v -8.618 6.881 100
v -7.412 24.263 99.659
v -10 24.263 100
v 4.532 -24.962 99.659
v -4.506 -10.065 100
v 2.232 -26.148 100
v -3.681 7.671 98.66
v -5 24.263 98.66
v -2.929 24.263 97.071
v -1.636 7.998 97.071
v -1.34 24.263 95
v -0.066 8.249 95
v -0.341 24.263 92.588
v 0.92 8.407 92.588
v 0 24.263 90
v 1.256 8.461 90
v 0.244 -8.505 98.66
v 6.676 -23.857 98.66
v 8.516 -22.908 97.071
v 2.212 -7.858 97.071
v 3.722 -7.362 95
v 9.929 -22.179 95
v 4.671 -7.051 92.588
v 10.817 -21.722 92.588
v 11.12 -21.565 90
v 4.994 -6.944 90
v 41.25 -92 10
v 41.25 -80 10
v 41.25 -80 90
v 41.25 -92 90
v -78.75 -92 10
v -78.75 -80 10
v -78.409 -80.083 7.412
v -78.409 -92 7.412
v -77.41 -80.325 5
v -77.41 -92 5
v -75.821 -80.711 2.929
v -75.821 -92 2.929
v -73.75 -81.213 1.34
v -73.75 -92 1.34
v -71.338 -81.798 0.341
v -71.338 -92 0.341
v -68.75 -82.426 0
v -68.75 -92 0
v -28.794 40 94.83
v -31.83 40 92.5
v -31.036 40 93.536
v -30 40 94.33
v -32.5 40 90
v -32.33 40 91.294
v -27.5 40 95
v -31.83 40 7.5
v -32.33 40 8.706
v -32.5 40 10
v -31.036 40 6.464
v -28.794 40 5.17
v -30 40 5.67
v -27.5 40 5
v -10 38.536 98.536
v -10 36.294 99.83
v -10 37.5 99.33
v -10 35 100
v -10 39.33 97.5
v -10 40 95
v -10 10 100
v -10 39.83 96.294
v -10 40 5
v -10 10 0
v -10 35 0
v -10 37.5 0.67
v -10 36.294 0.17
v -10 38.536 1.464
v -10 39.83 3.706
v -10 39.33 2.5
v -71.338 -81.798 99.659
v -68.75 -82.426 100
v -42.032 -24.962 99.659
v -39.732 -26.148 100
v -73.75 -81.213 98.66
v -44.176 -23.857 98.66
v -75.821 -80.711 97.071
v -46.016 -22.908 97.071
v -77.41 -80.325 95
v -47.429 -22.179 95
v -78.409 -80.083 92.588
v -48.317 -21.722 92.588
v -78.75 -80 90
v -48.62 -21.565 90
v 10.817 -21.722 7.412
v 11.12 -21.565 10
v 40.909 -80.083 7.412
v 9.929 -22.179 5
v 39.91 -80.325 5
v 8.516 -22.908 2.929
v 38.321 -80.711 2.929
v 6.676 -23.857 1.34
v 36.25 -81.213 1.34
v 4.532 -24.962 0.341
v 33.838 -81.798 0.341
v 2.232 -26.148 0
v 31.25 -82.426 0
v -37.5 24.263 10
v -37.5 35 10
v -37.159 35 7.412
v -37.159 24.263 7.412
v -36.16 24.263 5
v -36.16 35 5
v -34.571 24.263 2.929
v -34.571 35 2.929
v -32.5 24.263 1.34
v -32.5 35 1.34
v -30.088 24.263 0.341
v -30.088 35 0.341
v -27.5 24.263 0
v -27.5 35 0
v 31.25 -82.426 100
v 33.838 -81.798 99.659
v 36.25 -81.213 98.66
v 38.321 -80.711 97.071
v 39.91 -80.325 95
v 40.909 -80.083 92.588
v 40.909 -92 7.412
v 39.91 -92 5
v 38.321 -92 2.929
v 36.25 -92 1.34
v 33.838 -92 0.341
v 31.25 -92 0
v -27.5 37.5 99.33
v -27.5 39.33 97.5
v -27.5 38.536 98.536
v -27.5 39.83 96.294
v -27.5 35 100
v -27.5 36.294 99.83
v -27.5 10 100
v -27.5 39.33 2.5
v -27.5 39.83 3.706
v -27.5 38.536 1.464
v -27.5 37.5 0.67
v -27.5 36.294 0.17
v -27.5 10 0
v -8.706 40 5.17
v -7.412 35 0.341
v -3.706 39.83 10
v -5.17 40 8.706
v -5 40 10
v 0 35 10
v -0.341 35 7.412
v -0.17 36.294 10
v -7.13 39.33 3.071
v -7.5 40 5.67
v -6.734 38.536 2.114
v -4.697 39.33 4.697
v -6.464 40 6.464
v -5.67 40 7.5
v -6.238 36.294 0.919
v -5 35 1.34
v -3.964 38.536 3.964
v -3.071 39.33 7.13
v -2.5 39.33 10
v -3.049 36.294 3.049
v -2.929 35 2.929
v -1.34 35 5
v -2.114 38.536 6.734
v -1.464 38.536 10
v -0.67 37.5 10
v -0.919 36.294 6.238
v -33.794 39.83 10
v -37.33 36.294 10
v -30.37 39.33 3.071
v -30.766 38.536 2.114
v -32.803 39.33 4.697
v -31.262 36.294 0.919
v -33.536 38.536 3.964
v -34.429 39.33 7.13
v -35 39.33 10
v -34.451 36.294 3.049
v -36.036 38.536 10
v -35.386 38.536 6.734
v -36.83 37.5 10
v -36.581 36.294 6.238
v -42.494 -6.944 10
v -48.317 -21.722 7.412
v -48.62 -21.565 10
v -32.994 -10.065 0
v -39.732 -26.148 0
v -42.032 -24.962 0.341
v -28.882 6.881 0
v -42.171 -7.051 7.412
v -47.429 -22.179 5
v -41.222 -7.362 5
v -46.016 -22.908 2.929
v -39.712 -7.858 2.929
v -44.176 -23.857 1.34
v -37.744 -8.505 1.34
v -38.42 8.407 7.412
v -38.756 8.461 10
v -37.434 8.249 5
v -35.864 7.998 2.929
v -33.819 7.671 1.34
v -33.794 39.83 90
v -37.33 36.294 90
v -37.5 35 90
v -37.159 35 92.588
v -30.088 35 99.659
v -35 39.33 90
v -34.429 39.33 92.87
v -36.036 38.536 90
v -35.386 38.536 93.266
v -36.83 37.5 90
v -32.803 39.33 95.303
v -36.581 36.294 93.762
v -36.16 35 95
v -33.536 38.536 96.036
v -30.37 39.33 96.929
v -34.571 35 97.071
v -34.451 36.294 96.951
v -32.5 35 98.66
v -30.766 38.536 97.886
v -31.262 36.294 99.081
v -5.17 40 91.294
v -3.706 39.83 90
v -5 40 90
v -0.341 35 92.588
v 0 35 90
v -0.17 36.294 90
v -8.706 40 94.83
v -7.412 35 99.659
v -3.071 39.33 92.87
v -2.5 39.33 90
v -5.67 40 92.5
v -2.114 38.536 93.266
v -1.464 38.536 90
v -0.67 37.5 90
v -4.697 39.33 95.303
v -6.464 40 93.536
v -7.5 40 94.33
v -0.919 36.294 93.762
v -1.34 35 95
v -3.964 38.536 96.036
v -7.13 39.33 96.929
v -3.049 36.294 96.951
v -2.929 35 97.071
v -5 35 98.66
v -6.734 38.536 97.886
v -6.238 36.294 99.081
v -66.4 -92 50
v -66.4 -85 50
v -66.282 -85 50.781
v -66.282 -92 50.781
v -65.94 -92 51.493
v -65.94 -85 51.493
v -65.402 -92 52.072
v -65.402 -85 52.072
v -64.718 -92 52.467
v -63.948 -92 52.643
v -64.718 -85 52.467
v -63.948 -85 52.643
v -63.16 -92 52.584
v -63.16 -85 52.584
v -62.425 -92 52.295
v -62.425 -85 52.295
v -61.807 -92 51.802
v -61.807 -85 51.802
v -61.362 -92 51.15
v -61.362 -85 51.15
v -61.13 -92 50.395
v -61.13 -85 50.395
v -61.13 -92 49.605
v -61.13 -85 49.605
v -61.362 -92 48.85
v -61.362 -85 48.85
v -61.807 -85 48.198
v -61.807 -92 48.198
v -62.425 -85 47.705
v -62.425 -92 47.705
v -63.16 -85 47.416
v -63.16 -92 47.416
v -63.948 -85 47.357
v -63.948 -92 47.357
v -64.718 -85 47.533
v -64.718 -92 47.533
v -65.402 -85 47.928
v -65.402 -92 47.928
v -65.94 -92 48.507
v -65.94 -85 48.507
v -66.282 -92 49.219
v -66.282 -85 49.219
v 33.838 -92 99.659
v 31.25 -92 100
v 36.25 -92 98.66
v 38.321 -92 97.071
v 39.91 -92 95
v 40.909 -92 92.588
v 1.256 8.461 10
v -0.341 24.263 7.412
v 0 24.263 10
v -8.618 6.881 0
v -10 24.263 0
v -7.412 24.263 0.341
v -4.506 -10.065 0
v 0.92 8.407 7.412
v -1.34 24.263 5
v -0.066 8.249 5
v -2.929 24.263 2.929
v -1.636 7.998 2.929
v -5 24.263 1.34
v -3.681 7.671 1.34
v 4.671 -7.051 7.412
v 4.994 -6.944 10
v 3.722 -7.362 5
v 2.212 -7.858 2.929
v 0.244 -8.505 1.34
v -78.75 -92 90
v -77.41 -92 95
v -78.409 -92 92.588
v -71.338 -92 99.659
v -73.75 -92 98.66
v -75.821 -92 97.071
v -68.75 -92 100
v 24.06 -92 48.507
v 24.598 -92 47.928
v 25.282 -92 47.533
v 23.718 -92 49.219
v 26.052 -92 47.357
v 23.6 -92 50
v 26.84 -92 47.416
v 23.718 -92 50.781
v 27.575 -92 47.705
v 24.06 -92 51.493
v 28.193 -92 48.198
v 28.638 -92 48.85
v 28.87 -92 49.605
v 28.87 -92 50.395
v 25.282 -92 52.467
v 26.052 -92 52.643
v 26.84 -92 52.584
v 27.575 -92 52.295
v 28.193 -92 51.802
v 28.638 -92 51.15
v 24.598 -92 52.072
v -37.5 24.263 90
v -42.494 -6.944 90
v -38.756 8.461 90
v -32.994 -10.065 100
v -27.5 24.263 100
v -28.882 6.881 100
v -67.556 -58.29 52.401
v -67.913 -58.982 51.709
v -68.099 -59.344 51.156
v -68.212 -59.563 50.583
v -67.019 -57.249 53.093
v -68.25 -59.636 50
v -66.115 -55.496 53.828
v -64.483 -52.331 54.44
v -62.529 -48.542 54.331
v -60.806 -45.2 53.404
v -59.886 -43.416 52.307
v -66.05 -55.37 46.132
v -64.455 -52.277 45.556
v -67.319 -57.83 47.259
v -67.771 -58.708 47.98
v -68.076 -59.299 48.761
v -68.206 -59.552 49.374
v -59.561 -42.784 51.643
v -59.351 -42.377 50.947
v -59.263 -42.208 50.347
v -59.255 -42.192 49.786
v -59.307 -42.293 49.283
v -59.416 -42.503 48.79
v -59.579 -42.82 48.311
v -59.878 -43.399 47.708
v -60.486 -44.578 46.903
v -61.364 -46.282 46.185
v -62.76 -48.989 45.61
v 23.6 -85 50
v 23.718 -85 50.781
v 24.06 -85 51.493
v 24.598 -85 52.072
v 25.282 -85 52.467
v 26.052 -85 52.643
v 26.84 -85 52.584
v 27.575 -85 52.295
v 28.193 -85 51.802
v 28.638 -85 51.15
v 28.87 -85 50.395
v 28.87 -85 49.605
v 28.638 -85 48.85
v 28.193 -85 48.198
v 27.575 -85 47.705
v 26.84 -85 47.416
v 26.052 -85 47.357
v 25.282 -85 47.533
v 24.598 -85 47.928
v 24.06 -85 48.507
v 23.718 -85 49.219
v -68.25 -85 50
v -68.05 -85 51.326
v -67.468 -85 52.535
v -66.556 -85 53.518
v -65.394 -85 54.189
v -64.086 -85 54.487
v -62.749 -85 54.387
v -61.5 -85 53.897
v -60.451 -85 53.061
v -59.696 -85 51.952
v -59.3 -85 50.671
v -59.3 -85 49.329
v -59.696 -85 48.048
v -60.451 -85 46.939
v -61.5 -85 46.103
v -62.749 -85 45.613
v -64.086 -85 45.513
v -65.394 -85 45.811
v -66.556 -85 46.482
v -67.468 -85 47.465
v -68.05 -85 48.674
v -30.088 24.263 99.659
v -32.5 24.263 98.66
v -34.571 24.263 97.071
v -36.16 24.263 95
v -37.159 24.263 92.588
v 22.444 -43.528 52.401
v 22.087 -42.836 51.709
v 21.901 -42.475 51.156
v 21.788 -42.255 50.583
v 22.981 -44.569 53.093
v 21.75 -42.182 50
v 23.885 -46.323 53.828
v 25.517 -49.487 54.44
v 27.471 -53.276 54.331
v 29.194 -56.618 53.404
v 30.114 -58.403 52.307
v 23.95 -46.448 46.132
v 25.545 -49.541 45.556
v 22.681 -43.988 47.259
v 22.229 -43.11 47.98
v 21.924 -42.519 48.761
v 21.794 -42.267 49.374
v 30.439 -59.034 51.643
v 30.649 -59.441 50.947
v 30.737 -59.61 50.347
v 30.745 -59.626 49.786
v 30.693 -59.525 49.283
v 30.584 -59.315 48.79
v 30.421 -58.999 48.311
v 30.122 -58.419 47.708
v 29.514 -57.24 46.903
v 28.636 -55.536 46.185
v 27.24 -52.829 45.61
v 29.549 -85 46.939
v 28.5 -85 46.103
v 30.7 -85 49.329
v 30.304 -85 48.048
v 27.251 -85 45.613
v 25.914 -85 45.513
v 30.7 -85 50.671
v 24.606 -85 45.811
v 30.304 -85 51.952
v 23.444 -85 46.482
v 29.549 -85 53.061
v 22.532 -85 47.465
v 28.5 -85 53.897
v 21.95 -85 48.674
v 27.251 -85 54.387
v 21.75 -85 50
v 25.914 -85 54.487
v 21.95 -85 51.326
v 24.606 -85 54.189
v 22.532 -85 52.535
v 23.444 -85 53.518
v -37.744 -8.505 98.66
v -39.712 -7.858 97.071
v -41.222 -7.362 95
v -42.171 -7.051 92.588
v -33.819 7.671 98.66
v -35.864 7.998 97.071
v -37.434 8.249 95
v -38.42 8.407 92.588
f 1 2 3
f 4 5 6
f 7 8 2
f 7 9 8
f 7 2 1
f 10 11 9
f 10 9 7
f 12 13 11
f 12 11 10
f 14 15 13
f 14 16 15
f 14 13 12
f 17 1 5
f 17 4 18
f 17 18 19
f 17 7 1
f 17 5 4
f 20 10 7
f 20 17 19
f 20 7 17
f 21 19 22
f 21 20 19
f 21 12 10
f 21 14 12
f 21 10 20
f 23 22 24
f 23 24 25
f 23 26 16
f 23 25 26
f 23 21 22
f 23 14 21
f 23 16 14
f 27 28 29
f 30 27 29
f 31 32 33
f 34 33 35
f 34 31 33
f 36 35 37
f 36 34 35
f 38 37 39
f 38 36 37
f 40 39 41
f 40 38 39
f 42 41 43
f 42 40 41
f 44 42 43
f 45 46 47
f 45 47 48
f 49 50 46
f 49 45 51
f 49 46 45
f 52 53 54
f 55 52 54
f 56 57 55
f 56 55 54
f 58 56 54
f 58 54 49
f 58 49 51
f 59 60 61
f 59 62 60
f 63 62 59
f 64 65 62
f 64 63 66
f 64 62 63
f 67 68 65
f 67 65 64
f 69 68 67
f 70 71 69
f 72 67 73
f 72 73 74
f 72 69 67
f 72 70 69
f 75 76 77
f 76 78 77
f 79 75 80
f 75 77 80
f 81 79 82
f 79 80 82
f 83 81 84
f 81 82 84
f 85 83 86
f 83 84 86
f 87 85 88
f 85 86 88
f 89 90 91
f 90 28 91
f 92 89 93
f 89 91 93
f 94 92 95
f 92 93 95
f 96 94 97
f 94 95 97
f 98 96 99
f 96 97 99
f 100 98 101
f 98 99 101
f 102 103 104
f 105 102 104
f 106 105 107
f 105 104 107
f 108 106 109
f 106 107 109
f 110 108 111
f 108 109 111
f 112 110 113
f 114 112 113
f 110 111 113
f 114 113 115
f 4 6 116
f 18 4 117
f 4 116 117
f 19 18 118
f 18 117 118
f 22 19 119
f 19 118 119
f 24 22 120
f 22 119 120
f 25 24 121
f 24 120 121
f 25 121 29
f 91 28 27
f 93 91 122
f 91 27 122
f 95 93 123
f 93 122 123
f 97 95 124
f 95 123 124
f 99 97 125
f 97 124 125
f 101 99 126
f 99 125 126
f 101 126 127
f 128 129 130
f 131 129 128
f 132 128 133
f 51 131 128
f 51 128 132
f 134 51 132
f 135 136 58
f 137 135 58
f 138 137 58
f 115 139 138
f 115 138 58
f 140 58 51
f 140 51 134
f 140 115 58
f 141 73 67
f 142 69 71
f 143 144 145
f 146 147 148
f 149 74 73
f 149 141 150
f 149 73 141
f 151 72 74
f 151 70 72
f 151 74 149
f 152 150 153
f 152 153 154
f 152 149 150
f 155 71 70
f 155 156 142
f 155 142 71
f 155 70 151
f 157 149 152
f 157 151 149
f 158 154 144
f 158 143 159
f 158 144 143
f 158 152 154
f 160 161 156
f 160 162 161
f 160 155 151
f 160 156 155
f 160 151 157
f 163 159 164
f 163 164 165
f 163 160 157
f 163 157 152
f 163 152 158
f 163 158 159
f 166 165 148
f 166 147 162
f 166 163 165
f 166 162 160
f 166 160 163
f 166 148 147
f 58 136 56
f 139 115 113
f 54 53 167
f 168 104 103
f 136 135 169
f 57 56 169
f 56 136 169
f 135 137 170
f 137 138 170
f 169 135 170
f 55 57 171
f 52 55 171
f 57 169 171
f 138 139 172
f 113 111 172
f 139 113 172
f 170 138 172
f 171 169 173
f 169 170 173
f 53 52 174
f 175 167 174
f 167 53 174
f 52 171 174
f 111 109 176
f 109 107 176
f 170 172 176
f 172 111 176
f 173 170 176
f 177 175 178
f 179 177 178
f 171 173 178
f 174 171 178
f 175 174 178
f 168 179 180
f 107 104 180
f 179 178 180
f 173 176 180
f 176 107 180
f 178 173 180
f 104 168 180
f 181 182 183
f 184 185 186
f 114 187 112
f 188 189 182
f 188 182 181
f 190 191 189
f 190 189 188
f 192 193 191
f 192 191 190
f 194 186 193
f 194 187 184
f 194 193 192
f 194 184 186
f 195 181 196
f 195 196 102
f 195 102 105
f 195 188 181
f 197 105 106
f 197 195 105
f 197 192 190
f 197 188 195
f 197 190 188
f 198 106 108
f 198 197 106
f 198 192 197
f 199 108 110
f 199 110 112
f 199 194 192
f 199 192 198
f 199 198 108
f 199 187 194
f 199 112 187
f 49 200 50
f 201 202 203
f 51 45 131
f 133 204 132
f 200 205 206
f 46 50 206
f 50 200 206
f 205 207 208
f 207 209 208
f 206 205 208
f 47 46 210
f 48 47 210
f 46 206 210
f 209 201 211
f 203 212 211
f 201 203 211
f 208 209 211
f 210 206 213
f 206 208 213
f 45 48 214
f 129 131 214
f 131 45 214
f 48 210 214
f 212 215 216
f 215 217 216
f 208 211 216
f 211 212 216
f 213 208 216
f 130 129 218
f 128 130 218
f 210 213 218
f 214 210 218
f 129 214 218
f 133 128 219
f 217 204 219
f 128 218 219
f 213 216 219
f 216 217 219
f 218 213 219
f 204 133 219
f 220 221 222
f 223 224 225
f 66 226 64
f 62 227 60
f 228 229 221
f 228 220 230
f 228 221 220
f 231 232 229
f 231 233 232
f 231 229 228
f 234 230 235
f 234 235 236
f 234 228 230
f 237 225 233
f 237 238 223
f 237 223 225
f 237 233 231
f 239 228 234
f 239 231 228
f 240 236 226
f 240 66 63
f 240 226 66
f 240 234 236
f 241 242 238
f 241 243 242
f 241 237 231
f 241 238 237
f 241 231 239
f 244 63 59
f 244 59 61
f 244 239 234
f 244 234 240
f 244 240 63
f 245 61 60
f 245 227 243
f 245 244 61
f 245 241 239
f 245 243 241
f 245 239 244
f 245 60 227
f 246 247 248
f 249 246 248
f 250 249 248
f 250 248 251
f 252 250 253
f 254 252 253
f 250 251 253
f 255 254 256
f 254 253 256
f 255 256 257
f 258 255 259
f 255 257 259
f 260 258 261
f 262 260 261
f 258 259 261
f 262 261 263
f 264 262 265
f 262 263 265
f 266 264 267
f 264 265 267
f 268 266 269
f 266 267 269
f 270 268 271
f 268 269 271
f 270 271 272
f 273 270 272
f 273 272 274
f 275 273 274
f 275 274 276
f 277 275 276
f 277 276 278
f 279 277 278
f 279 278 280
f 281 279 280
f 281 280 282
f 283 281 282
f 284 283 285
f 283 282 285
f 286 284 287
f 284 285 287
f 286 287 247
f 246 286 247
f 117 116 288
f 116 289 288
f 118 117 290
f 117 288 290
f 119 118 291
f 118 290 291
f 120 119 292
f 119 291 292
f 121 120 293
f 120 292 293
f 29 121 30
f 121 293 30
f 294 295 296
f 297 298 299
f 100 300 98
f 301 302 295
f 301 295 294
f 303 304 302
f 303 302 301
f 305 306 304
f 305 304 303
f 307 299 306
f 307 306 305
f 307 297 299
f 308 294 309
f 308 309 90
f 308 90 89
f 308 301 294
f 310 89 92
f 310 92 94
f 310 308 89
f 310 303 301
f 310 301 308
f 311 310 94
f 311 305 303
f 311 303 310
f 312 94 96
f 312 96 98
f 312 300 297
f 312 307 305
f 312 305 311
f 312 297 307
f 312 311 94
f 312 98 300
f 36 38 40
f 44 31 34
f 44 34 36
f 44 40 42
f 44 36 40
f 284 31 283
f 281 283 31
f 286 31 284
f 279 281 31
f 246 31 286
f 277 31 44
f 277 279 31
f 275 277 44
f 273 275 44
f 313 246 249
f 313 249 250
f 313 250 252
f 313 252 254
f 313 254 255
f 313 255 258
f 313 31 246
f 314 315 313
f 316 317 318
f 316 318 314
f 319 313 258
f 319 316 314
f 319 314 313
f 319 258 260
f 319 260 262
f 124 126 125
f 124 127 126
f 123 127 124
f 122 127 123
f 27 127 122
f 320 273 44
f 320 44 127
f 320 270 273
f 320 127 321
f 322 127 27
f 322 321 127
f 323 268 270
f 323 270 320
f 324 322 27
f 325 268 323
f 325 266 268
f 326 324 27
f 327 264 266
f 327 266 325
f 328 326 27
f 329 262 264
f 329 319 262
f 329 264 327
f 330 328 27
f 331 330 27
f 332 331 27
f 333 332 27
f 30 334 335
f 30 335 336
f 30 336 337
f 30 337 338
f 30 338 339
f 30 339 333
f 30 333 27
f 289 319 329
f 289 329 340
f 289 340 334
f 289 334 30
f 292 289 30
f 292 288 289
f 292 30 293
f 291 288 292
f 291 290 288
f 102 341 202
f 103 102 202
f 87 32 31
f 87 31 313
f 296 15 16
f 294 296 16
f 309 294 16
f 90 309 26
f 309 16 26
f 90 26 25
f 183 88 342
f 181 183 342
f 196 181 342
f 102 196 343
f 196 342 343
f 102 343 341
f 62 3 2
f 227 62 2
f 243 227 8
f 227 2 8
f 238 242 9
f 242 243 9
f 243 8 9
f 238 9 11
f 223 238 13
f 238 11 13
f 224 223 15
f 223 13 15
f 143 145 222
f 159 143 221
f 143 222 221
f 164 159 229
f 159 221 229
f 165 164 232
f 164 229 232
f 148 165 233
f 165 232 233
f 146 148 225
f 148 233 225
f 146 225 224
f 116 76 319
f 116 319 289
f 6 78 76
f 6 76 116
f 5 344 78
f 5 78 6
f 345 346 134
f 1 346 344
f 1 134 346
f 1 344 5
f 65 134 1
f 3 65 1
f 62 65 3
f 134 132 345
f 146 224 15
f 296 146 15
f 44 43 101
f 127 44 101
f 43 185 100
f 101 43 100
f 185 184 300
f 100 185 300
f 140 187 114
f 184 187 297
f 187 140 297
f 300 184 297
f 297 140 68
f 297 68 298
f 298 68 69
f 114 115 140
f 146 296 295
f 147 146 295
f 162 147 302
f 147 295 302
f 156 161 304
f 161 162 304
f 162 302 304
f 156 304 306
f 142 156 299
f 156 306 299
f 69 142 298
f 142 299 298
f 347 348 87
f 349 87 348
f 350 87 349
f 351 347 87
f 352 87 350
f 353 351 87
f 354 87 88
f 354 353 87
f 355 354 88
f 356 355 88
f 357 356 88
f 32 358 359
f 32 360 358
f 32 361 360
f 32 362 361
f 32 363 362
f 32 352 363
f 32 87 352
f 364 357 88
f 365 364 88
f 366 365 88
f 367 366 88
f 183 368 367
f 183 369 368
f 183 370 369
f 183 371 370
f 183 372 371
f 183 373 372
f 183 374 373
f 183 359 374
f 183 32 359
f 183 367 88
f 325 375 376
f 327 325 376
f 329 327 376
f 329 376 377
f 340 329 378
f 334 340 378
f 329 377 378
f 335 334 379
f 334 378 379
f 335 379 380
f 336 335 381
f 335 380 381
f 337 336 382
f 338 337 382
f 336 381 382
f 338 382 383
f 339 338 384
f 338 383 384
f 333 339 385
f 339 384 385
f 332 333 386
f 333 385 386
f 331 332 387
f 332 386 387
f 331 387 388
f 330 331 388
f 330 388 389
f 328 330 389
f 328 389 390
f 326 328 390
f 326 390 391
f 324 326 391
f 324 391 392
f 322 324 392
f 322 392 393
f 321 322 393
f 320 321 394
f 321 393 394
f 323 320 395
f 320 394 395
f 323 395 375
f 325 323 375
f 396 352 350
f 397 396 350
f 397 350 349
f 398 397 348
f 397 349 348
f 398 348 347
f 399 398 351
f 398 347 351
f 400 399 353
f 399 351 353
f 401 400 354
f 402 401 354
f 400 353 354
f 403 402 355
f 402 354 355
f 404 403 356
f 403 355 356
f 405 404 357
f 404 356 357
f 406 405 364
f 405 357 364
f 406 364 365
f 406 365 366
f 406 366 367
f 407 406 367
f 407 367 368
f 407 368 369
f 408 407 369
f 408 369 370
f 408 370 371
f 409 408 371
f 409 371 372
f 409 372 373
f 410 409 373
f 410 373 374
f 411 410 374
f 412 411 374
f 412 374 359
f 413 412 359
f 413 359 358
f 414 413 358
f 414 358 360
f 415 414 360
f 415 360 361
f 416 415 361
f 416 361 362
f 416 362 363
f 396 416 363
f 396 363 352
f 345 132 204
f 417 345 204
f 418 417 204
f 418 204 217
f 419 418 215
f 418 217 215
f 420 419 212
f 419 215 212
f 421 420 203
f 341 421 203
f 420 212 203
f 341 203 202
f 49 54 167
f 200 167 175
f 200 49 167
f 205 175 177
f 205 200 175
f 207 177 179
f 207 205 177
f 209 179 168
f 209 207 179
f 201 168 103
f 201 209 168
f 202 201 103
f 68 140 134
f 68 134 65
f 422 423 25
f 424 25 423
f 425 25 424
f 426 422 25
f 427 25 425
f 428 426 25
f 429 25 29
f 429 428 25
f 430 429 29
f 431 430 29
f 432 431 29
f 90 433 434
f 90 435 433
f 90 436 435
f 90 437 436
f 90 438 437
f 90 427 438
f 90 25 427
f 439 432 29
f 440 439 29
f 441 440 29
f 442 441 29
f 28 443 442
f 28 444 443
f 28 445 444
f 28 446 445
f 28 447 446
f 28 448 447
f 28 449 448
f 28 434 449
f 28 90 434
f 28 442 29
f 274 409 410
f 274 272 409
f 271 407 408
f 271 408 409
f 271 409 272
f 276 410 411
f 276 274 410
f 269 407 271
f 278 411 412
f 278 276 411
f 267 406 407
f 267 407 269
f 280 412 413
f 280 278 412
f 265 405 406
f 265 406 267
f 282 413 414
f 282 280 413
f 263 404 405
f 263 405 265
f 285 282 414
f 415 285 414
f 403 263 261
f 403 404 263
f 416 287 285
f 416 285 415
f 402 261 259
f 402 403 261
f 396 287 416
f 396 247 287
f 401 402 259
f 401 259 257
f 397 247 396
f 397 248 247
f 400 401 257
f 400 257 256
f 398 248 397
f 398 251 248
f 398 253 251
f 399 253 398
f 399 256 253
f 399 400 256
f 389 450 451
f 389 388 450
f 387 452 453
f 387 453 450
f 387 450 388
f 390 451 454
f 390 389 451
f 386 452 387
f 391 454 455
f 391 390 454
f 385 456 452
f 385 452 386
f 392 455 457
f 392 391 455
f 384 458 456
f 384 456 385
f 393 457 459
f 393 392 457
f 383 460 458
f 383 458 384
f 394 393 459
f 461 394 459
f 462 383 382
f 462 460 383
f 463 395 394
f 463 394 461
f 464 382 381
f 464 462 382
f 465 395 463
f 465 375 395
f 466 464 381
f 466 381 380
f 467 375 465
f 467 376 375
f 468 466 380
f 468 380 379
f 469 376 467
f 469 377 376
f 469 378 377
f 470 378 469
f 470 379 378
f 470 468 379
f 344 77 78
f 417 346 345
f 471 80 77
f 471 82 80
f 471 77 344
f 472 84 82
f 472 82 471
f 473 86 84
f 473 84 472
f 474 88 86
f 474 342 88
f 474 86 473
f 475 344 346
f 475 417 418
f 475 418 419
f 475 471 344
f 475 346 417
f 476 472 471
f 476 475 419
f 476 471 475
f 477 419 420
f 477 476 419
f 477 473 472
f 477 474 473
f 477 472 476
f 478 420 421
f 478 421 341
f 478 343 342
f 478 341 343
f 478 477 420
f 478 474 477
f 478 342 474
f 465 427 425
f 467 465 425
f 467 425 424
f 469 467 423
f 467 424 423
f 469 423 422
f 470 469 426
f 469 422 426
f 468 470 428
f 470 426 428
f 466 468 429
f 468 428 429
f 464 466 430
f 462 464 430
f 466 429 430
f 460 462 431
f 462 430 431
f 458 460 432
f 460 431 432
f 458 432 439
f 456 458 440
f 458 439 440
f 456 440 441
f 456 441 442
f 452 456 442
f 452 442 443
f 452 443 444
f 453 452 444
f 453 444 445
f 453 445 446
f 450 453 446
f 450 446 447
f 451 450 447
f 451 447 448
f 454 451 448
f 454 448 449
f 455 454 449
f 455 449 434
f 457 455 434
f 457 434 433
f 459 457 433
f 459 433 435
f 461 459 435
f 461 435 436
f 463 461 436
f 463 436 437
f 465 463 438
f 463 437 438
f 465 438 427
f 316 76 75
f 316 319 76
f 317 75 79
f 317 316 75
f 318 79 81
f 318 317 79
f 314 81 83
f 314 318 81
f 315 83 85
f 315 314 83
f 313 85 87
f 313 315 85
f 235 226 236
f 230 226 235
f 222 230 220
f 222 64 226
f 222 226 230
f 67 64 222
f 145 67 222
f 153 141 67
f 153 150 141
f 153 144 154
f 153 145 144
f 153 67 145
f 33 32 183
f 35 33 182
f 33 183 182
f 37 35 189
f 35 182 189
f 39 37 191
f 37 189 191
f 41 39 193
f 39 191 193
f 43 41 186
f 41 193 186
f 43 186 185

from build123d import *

# Parameters (mm, degrees)
BOSS_EXTRUDE1_DEPTH = 100
SKETCH2_W           = 120
SKETCH2_H           = 100
BOSS_EXTRUDE2_DEPTH = 92
SKETCH3_R           = 4.5
CUT_EXTRUDE1_DEPTH  = 85
SKETCH4_R           = 2.65
CUT_EXTRUDE2_DEPTH  = 7
CUT_EXTRUDE3_REACH  = 159.053
FILLET1_R           = 100
FILLET2_R           = 100
FILLET4_R           = 10
FILLET5_R           = 5


with BuildPart() as part:
    # Sketch1 → Boss-Extrude1 (new body)
    with BuildSketch(Plane.XY):
        Polygon((0, 0), (-37.5, 0), (-37.5, 40), (-27.5, 40), (-27.5, 10), (-10, 10), (-10, 40), (0, 40), align=None)
    extrude(amount=BOSS_EXTRUDE1_DEPTH)

    # Sketch2 → Boss-Extrude2 (add)
    with BuildSketch(Plane.XZ):
        with Locations((-18.75, 50)):
            Rectangle(SKETCH2_W, SKETCH2_H)
    extrude(amount=BOSS_EXTRUDE2_DEPTH)

    # Sketch3 → Cut-Extrude1 (cut)
    with BuildSketch(Plane(origin=(0, 0, 0), x_dir=(1, 0, 0), z_dir=(0, 1, 0))):
        with Locations(Location((26.25, -50, 0), (0, 0, 180))):
            Circle(SKETCH3_R)
        with Locations(Location((-63.75, -50, 0), (0, 0, 180))):
            Circle(SKETCH3_R)
    extrude(amount=-CUT_EXTRUDE1_DEPTH, mode=Mode.SUBTRACT)

    # Sketch4 → Cut-Extrude2 (cut)
    with BuildSketch(Plane(origin=(0, -85, 0), x_dir=(1, 0, 0), z_dir=(0, 1, 0))):
        with Locations(Location((26.25, -50, 0), (0, 0, 180))):
            Circle(SKETCH4_R)
        with Locations(Location((-63.75, -50, 0), (0, 0, 180))):
            Circle(SKETCH4_R)
    extrude(amount=-CUT_EXTRUDE2_DEPTH, mode=Mode.SUBTRACT)

    # Cut-Extrude3: up to this face of the body (flat: up to its plane)
    cut_extrude3_end = Plane(part.part.faces().sort_by_distance((-18.75, -40.86267166, 100))[0])
    # Sketch5 → Cut-Extrude3 (cut, up to the picked face)
    with BuildSketch(Plane(origin=(0, 0, 0), x_dir=(-1, 0, 0), z_dir=(0, 0, -1)), mode=Mode.PRIVATE) as cut_extrude3_sk1:
        Polygon((0, 0), (-41.25, -80), (-41.25, 0), align=None)
    cut_extrude3_tool1 = split(extrude(cut_extrude3_sk1.sketch, amount=-CUT_EXTRUDE3_REACH, mode=Mode.PRIVATE), bisect_by=cut_extrude3_end, keep=Keep.BOTH, mode=Mode.PRIVATE)
    # Sketch5 → Cut-Extrude3 (cut, up to the picked face)
    with BuildSketch(Plane(origin=(0, 0, 0), x_dir=(-1, 0, 0), z_dir=(0, 0, -1)), mode=Mode.PRIVATE) as cut_extrude3_sk2:
        Polygon((37.5, 0), (78.75, 0), (78.75, -80), align=None)
    cut_extrude3_tool2 = split(extrude(cut_extrude3_sk2.sketch, amount=-CUT_EXTRUDE3_REACH, mode=Mode.PRIVATE), bisect_by=cut_extrude3_end, keep=Keep.BOTH, mode=Mode.PRIVATE)
    add(cut_extrude3_tool1.solids().sort_by(Axis((27.5, -26.666667, 0), (0, 0, 1)))[0], mode=Mode.SUBTRACT)
    add(cut_extrude3_tool2.solids().sort_by(Axis((-65, -26.666667, 0), (0, 0, 1)))[0], mode=Mode.SUBTRACT)

    # Fillet1
    fillet1_edges = [part.edges().sort_by_distance(p)[0] for p in [
        (0, 0, 50),
    ]]
    fillet(fillet1_edges, radius=FILLET1_R)

    # Fillet2
    fillet2_edges = [part.edges().sort_by_distance(p)[0] for p in [
        (-37.5, 0, 50),
    ]]
    fillet(fillet2_edges, radius=FILLET2_R)

    # Fillet4
    fillet4_edges = [part.edges().sort_by_distance(p)[0] for p in [
        (-37.5, 32.131733499, 100),
        (-40.319673611, 0.684150576, 100),
        (-37.5, 32.131733499, 0),
        (-40.319673611, 0.684150576, 0),
        (-63.68484163, -50.78272316, 100),
        (-63.68484163, -50.78272316, 0),
        (0, 32.131733499, 0),
        (2.819673611, 0.684150576, 0),
        (0, 32.131733499, 100),
        (2.819673611, 0.684150576, 100),
        (26.18484163, -50.78272316, 0),
        (26.18484163, -50.78272316, 100),
        (41.25, -86, 0),
        (41.25, -86, 100),
        (-78.75, -86, 100),
        (-78.75, -86, 0),
    ]]
    fillet(fillet4_edges, radius=FILLET4_R - 0.0001)  # a hair under: the kernel refuses the full size

    # Fillet5
    fillet5_edges = [part.edges().sort_by_distance(p)[0] for p in [
        (-37.5, 40, 50),
        (-34.571097101, 40, 97.071097101),
        (-34.571097101, 40, 2.928902899),
        (0, 40, 50),
        (-2.928902899, 40, 97.071097101),
        (-2.928902899, 40, 2.928902899),
    ]]
    fillet(fillet5_edges, radius=FILLET5_R)


solid = part.part
